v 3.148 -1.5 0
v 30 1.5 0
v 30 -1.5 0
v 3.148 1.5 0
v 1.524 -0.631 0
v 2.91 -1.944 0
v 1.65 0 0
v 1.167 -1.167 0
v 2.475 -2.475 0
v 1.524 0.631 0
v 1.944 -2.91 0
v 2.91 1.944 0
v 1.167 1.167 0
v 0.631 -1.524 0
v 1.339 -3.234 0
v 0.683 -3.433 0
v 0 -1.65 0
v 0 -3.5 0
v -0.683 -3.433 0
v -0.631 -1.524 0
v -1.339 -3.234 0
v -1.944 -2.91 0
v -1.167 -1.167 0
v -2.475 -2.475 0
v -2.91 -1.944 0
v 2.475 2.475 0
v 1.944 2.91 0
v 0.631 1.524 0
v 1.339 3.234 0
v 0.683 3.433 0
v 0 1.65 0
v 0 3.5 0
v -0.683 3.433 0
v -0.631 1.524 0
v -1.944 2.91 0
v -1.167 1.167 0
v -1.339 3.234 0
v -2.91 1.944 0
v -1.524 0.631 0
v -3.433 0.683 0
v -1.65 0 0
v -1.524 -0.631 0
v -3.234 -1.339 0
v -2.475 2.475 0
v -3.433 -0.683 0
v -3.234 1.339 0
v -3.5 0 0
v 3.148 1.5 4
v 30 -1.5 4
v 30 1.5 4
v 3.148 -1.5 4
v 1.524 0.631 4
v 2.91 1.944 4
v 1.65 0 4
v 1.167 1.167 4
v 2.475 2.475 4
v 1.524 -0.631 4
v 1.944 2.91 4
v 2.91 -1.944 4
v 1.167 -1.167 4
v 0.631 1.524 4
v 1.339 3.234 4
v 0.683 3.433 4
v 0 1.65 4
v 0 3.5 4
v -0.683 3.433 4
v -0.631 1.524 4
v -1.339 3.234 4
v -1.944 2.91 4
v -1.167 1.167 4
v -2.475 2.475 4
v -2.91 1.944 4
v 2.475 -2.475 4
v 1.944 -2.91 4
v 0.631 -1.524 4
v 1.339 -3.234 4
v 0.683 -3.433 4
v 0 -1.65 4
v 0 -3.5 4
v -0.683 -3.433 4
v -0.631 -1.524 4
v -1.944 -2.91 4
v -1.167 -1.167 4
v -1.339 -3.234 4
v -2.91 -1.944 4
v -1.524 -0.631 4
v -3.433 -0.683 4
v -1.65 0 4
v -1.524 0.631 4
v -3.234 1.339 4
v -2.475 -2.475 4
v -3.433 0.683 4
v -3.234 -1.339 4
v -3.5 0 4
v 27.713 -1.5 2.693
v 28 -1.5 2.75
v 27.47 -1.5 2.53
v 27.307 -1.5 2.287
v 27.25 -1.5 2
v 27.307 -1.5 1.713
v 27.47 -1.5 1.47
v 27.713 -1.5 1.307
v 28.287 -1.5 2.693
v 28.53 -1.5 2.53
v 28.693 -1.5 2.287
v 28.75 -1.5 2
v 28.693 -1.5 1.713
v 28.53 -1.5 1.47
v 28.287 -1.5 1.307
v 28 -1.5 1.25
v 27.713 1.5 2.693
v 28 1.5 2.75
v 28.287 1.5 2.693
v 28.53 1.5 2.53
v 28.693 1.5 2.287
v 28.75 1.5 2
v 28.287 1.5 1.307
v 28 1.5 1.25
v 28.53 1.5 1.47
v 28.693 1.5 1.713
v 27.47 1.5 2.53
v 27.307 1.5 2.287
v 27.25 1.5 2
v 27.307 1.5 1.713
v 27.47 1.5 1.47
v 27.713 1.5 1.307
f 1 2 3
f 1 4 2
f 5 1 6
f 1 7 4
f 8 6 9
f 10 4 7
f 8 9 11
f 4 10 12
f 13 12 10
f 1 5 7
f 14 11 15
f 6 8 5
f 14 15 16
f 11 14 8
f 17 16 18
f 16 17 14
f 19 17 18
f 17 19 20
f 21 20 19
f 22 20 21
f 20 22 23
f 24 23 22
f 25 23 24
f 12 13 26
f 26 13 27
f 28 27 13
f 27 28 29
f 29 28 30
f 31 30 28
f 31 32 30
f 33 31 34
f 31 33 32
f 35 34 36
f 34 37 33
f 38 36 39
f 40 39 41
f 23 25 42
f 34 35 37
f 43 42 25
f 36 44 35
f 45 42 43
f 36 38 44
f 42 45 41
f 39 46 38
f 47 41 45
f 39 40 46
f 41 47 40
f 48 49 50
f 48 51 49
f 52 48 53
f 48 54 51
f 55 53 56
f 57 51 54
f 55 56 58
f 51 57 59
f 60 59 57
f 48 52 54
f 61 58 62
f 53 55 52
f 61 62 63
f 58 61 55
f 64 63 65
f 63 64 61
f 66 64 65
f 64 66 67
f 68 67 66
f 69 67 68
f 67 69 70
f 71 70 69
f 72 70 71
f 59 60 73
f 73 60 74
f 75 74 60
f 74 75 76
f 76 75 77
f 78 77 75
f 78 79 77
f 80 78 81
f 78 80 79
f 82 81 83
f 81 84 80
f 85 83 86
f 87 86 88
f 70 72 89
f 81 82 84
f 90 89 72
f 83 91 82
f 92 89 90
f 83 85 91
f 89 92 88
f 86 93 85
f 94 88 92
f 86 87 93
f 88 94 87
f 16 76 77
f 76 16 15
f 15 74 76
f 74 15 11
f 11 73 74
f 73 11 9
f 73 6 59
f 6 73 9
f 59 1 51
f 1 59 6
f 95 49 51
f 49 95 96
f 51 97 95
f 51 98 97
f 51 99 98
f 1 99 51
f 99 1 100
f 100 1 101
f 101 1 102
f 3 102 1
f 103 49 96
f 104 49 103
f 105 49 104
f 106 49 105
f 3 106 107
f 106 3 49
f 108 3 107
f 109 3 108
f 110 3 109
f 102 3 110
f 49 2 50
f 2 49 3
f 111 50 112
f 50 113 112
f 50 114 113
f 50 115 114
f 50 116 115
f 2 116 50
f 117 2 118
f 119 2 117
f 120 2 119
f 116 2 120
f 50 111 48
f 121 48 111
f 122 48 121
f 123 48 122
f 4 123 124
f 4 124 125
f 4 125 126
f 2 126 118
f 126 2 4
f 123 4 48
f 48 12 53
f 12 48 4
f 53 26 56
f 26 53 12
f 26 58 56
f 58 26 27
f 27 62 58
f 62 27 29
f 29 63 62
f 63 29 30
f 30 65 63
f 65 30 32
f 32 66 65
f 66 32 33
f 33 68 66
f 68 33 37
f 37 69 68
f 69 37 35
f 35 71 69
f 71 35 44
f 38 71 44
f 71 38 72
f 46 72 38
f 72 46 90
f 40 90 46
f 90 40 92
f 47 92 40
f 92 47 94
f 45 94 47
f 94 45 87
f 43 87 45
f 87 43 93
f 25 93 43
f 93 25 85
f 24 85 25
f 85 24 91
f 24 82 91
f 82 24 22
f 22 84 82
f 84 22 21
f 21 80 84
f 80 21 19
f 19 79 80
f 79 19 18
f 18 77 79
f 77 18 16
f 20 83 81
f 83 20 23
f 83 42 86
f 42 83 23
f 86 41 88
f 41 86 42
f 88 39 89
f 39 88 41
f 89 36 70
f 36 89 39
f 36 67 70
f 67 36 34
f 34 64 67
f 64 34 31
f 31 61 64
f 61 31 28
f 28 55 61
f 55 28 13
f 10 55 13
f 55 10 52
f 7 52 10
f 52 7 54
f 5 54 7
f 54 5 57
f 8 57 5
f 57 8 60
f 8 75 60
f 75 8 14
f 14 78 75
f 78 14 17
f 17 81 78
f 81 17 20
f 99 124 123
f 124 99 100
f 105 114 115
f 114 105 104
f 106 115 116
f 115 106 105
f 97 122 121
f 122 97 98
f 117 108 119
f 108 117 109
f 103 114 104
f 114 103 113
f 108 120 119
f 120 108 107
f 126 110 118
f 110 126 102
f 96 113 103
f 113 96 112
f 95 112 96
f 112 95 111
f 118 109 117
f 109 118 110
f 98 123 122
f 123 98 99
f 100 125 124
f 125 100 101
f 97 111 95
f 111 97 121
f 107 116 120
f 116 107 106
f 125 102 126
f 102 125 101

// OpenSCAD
// file: dimensions.scad
width = 264;
depth = 80;

side_block_size = 10;

plate_mounting_screw_size = 3;
plate_mounting_screw_centres = 45;

switch_mounting_screw_size = 3;
switch_mounting_screw_centres = 12;

switch_arm_mounting_screw_size = 3;
// main file
include <dimensions.scad>

length = 30;
height = 4;
thickness = 3;

module SwitchLever() {
  difference() {
    linear_extrude(height) {
      difference() {
        // Body
        union() {
          circle(d = switch_arm_mounting_screw_size + 4, $fn = 32);
          translate([length / 2, 0]) {
            square([length, thickness], center = true);
          }
        }

        // Block mounting hole
        circle(d = switch_arm_mounting_screw_size + 0.3, $fn = 16);
      }
    }

    // Wire tie point
    translate([length - 2, 0, height / 2]) {
      rotate([90, 0, 0]) {
        cylinder(d = 1.5, h = thickness + 0.1, center = true, $fn = 16);
      }
    }
  }
}

SwitchLever();
